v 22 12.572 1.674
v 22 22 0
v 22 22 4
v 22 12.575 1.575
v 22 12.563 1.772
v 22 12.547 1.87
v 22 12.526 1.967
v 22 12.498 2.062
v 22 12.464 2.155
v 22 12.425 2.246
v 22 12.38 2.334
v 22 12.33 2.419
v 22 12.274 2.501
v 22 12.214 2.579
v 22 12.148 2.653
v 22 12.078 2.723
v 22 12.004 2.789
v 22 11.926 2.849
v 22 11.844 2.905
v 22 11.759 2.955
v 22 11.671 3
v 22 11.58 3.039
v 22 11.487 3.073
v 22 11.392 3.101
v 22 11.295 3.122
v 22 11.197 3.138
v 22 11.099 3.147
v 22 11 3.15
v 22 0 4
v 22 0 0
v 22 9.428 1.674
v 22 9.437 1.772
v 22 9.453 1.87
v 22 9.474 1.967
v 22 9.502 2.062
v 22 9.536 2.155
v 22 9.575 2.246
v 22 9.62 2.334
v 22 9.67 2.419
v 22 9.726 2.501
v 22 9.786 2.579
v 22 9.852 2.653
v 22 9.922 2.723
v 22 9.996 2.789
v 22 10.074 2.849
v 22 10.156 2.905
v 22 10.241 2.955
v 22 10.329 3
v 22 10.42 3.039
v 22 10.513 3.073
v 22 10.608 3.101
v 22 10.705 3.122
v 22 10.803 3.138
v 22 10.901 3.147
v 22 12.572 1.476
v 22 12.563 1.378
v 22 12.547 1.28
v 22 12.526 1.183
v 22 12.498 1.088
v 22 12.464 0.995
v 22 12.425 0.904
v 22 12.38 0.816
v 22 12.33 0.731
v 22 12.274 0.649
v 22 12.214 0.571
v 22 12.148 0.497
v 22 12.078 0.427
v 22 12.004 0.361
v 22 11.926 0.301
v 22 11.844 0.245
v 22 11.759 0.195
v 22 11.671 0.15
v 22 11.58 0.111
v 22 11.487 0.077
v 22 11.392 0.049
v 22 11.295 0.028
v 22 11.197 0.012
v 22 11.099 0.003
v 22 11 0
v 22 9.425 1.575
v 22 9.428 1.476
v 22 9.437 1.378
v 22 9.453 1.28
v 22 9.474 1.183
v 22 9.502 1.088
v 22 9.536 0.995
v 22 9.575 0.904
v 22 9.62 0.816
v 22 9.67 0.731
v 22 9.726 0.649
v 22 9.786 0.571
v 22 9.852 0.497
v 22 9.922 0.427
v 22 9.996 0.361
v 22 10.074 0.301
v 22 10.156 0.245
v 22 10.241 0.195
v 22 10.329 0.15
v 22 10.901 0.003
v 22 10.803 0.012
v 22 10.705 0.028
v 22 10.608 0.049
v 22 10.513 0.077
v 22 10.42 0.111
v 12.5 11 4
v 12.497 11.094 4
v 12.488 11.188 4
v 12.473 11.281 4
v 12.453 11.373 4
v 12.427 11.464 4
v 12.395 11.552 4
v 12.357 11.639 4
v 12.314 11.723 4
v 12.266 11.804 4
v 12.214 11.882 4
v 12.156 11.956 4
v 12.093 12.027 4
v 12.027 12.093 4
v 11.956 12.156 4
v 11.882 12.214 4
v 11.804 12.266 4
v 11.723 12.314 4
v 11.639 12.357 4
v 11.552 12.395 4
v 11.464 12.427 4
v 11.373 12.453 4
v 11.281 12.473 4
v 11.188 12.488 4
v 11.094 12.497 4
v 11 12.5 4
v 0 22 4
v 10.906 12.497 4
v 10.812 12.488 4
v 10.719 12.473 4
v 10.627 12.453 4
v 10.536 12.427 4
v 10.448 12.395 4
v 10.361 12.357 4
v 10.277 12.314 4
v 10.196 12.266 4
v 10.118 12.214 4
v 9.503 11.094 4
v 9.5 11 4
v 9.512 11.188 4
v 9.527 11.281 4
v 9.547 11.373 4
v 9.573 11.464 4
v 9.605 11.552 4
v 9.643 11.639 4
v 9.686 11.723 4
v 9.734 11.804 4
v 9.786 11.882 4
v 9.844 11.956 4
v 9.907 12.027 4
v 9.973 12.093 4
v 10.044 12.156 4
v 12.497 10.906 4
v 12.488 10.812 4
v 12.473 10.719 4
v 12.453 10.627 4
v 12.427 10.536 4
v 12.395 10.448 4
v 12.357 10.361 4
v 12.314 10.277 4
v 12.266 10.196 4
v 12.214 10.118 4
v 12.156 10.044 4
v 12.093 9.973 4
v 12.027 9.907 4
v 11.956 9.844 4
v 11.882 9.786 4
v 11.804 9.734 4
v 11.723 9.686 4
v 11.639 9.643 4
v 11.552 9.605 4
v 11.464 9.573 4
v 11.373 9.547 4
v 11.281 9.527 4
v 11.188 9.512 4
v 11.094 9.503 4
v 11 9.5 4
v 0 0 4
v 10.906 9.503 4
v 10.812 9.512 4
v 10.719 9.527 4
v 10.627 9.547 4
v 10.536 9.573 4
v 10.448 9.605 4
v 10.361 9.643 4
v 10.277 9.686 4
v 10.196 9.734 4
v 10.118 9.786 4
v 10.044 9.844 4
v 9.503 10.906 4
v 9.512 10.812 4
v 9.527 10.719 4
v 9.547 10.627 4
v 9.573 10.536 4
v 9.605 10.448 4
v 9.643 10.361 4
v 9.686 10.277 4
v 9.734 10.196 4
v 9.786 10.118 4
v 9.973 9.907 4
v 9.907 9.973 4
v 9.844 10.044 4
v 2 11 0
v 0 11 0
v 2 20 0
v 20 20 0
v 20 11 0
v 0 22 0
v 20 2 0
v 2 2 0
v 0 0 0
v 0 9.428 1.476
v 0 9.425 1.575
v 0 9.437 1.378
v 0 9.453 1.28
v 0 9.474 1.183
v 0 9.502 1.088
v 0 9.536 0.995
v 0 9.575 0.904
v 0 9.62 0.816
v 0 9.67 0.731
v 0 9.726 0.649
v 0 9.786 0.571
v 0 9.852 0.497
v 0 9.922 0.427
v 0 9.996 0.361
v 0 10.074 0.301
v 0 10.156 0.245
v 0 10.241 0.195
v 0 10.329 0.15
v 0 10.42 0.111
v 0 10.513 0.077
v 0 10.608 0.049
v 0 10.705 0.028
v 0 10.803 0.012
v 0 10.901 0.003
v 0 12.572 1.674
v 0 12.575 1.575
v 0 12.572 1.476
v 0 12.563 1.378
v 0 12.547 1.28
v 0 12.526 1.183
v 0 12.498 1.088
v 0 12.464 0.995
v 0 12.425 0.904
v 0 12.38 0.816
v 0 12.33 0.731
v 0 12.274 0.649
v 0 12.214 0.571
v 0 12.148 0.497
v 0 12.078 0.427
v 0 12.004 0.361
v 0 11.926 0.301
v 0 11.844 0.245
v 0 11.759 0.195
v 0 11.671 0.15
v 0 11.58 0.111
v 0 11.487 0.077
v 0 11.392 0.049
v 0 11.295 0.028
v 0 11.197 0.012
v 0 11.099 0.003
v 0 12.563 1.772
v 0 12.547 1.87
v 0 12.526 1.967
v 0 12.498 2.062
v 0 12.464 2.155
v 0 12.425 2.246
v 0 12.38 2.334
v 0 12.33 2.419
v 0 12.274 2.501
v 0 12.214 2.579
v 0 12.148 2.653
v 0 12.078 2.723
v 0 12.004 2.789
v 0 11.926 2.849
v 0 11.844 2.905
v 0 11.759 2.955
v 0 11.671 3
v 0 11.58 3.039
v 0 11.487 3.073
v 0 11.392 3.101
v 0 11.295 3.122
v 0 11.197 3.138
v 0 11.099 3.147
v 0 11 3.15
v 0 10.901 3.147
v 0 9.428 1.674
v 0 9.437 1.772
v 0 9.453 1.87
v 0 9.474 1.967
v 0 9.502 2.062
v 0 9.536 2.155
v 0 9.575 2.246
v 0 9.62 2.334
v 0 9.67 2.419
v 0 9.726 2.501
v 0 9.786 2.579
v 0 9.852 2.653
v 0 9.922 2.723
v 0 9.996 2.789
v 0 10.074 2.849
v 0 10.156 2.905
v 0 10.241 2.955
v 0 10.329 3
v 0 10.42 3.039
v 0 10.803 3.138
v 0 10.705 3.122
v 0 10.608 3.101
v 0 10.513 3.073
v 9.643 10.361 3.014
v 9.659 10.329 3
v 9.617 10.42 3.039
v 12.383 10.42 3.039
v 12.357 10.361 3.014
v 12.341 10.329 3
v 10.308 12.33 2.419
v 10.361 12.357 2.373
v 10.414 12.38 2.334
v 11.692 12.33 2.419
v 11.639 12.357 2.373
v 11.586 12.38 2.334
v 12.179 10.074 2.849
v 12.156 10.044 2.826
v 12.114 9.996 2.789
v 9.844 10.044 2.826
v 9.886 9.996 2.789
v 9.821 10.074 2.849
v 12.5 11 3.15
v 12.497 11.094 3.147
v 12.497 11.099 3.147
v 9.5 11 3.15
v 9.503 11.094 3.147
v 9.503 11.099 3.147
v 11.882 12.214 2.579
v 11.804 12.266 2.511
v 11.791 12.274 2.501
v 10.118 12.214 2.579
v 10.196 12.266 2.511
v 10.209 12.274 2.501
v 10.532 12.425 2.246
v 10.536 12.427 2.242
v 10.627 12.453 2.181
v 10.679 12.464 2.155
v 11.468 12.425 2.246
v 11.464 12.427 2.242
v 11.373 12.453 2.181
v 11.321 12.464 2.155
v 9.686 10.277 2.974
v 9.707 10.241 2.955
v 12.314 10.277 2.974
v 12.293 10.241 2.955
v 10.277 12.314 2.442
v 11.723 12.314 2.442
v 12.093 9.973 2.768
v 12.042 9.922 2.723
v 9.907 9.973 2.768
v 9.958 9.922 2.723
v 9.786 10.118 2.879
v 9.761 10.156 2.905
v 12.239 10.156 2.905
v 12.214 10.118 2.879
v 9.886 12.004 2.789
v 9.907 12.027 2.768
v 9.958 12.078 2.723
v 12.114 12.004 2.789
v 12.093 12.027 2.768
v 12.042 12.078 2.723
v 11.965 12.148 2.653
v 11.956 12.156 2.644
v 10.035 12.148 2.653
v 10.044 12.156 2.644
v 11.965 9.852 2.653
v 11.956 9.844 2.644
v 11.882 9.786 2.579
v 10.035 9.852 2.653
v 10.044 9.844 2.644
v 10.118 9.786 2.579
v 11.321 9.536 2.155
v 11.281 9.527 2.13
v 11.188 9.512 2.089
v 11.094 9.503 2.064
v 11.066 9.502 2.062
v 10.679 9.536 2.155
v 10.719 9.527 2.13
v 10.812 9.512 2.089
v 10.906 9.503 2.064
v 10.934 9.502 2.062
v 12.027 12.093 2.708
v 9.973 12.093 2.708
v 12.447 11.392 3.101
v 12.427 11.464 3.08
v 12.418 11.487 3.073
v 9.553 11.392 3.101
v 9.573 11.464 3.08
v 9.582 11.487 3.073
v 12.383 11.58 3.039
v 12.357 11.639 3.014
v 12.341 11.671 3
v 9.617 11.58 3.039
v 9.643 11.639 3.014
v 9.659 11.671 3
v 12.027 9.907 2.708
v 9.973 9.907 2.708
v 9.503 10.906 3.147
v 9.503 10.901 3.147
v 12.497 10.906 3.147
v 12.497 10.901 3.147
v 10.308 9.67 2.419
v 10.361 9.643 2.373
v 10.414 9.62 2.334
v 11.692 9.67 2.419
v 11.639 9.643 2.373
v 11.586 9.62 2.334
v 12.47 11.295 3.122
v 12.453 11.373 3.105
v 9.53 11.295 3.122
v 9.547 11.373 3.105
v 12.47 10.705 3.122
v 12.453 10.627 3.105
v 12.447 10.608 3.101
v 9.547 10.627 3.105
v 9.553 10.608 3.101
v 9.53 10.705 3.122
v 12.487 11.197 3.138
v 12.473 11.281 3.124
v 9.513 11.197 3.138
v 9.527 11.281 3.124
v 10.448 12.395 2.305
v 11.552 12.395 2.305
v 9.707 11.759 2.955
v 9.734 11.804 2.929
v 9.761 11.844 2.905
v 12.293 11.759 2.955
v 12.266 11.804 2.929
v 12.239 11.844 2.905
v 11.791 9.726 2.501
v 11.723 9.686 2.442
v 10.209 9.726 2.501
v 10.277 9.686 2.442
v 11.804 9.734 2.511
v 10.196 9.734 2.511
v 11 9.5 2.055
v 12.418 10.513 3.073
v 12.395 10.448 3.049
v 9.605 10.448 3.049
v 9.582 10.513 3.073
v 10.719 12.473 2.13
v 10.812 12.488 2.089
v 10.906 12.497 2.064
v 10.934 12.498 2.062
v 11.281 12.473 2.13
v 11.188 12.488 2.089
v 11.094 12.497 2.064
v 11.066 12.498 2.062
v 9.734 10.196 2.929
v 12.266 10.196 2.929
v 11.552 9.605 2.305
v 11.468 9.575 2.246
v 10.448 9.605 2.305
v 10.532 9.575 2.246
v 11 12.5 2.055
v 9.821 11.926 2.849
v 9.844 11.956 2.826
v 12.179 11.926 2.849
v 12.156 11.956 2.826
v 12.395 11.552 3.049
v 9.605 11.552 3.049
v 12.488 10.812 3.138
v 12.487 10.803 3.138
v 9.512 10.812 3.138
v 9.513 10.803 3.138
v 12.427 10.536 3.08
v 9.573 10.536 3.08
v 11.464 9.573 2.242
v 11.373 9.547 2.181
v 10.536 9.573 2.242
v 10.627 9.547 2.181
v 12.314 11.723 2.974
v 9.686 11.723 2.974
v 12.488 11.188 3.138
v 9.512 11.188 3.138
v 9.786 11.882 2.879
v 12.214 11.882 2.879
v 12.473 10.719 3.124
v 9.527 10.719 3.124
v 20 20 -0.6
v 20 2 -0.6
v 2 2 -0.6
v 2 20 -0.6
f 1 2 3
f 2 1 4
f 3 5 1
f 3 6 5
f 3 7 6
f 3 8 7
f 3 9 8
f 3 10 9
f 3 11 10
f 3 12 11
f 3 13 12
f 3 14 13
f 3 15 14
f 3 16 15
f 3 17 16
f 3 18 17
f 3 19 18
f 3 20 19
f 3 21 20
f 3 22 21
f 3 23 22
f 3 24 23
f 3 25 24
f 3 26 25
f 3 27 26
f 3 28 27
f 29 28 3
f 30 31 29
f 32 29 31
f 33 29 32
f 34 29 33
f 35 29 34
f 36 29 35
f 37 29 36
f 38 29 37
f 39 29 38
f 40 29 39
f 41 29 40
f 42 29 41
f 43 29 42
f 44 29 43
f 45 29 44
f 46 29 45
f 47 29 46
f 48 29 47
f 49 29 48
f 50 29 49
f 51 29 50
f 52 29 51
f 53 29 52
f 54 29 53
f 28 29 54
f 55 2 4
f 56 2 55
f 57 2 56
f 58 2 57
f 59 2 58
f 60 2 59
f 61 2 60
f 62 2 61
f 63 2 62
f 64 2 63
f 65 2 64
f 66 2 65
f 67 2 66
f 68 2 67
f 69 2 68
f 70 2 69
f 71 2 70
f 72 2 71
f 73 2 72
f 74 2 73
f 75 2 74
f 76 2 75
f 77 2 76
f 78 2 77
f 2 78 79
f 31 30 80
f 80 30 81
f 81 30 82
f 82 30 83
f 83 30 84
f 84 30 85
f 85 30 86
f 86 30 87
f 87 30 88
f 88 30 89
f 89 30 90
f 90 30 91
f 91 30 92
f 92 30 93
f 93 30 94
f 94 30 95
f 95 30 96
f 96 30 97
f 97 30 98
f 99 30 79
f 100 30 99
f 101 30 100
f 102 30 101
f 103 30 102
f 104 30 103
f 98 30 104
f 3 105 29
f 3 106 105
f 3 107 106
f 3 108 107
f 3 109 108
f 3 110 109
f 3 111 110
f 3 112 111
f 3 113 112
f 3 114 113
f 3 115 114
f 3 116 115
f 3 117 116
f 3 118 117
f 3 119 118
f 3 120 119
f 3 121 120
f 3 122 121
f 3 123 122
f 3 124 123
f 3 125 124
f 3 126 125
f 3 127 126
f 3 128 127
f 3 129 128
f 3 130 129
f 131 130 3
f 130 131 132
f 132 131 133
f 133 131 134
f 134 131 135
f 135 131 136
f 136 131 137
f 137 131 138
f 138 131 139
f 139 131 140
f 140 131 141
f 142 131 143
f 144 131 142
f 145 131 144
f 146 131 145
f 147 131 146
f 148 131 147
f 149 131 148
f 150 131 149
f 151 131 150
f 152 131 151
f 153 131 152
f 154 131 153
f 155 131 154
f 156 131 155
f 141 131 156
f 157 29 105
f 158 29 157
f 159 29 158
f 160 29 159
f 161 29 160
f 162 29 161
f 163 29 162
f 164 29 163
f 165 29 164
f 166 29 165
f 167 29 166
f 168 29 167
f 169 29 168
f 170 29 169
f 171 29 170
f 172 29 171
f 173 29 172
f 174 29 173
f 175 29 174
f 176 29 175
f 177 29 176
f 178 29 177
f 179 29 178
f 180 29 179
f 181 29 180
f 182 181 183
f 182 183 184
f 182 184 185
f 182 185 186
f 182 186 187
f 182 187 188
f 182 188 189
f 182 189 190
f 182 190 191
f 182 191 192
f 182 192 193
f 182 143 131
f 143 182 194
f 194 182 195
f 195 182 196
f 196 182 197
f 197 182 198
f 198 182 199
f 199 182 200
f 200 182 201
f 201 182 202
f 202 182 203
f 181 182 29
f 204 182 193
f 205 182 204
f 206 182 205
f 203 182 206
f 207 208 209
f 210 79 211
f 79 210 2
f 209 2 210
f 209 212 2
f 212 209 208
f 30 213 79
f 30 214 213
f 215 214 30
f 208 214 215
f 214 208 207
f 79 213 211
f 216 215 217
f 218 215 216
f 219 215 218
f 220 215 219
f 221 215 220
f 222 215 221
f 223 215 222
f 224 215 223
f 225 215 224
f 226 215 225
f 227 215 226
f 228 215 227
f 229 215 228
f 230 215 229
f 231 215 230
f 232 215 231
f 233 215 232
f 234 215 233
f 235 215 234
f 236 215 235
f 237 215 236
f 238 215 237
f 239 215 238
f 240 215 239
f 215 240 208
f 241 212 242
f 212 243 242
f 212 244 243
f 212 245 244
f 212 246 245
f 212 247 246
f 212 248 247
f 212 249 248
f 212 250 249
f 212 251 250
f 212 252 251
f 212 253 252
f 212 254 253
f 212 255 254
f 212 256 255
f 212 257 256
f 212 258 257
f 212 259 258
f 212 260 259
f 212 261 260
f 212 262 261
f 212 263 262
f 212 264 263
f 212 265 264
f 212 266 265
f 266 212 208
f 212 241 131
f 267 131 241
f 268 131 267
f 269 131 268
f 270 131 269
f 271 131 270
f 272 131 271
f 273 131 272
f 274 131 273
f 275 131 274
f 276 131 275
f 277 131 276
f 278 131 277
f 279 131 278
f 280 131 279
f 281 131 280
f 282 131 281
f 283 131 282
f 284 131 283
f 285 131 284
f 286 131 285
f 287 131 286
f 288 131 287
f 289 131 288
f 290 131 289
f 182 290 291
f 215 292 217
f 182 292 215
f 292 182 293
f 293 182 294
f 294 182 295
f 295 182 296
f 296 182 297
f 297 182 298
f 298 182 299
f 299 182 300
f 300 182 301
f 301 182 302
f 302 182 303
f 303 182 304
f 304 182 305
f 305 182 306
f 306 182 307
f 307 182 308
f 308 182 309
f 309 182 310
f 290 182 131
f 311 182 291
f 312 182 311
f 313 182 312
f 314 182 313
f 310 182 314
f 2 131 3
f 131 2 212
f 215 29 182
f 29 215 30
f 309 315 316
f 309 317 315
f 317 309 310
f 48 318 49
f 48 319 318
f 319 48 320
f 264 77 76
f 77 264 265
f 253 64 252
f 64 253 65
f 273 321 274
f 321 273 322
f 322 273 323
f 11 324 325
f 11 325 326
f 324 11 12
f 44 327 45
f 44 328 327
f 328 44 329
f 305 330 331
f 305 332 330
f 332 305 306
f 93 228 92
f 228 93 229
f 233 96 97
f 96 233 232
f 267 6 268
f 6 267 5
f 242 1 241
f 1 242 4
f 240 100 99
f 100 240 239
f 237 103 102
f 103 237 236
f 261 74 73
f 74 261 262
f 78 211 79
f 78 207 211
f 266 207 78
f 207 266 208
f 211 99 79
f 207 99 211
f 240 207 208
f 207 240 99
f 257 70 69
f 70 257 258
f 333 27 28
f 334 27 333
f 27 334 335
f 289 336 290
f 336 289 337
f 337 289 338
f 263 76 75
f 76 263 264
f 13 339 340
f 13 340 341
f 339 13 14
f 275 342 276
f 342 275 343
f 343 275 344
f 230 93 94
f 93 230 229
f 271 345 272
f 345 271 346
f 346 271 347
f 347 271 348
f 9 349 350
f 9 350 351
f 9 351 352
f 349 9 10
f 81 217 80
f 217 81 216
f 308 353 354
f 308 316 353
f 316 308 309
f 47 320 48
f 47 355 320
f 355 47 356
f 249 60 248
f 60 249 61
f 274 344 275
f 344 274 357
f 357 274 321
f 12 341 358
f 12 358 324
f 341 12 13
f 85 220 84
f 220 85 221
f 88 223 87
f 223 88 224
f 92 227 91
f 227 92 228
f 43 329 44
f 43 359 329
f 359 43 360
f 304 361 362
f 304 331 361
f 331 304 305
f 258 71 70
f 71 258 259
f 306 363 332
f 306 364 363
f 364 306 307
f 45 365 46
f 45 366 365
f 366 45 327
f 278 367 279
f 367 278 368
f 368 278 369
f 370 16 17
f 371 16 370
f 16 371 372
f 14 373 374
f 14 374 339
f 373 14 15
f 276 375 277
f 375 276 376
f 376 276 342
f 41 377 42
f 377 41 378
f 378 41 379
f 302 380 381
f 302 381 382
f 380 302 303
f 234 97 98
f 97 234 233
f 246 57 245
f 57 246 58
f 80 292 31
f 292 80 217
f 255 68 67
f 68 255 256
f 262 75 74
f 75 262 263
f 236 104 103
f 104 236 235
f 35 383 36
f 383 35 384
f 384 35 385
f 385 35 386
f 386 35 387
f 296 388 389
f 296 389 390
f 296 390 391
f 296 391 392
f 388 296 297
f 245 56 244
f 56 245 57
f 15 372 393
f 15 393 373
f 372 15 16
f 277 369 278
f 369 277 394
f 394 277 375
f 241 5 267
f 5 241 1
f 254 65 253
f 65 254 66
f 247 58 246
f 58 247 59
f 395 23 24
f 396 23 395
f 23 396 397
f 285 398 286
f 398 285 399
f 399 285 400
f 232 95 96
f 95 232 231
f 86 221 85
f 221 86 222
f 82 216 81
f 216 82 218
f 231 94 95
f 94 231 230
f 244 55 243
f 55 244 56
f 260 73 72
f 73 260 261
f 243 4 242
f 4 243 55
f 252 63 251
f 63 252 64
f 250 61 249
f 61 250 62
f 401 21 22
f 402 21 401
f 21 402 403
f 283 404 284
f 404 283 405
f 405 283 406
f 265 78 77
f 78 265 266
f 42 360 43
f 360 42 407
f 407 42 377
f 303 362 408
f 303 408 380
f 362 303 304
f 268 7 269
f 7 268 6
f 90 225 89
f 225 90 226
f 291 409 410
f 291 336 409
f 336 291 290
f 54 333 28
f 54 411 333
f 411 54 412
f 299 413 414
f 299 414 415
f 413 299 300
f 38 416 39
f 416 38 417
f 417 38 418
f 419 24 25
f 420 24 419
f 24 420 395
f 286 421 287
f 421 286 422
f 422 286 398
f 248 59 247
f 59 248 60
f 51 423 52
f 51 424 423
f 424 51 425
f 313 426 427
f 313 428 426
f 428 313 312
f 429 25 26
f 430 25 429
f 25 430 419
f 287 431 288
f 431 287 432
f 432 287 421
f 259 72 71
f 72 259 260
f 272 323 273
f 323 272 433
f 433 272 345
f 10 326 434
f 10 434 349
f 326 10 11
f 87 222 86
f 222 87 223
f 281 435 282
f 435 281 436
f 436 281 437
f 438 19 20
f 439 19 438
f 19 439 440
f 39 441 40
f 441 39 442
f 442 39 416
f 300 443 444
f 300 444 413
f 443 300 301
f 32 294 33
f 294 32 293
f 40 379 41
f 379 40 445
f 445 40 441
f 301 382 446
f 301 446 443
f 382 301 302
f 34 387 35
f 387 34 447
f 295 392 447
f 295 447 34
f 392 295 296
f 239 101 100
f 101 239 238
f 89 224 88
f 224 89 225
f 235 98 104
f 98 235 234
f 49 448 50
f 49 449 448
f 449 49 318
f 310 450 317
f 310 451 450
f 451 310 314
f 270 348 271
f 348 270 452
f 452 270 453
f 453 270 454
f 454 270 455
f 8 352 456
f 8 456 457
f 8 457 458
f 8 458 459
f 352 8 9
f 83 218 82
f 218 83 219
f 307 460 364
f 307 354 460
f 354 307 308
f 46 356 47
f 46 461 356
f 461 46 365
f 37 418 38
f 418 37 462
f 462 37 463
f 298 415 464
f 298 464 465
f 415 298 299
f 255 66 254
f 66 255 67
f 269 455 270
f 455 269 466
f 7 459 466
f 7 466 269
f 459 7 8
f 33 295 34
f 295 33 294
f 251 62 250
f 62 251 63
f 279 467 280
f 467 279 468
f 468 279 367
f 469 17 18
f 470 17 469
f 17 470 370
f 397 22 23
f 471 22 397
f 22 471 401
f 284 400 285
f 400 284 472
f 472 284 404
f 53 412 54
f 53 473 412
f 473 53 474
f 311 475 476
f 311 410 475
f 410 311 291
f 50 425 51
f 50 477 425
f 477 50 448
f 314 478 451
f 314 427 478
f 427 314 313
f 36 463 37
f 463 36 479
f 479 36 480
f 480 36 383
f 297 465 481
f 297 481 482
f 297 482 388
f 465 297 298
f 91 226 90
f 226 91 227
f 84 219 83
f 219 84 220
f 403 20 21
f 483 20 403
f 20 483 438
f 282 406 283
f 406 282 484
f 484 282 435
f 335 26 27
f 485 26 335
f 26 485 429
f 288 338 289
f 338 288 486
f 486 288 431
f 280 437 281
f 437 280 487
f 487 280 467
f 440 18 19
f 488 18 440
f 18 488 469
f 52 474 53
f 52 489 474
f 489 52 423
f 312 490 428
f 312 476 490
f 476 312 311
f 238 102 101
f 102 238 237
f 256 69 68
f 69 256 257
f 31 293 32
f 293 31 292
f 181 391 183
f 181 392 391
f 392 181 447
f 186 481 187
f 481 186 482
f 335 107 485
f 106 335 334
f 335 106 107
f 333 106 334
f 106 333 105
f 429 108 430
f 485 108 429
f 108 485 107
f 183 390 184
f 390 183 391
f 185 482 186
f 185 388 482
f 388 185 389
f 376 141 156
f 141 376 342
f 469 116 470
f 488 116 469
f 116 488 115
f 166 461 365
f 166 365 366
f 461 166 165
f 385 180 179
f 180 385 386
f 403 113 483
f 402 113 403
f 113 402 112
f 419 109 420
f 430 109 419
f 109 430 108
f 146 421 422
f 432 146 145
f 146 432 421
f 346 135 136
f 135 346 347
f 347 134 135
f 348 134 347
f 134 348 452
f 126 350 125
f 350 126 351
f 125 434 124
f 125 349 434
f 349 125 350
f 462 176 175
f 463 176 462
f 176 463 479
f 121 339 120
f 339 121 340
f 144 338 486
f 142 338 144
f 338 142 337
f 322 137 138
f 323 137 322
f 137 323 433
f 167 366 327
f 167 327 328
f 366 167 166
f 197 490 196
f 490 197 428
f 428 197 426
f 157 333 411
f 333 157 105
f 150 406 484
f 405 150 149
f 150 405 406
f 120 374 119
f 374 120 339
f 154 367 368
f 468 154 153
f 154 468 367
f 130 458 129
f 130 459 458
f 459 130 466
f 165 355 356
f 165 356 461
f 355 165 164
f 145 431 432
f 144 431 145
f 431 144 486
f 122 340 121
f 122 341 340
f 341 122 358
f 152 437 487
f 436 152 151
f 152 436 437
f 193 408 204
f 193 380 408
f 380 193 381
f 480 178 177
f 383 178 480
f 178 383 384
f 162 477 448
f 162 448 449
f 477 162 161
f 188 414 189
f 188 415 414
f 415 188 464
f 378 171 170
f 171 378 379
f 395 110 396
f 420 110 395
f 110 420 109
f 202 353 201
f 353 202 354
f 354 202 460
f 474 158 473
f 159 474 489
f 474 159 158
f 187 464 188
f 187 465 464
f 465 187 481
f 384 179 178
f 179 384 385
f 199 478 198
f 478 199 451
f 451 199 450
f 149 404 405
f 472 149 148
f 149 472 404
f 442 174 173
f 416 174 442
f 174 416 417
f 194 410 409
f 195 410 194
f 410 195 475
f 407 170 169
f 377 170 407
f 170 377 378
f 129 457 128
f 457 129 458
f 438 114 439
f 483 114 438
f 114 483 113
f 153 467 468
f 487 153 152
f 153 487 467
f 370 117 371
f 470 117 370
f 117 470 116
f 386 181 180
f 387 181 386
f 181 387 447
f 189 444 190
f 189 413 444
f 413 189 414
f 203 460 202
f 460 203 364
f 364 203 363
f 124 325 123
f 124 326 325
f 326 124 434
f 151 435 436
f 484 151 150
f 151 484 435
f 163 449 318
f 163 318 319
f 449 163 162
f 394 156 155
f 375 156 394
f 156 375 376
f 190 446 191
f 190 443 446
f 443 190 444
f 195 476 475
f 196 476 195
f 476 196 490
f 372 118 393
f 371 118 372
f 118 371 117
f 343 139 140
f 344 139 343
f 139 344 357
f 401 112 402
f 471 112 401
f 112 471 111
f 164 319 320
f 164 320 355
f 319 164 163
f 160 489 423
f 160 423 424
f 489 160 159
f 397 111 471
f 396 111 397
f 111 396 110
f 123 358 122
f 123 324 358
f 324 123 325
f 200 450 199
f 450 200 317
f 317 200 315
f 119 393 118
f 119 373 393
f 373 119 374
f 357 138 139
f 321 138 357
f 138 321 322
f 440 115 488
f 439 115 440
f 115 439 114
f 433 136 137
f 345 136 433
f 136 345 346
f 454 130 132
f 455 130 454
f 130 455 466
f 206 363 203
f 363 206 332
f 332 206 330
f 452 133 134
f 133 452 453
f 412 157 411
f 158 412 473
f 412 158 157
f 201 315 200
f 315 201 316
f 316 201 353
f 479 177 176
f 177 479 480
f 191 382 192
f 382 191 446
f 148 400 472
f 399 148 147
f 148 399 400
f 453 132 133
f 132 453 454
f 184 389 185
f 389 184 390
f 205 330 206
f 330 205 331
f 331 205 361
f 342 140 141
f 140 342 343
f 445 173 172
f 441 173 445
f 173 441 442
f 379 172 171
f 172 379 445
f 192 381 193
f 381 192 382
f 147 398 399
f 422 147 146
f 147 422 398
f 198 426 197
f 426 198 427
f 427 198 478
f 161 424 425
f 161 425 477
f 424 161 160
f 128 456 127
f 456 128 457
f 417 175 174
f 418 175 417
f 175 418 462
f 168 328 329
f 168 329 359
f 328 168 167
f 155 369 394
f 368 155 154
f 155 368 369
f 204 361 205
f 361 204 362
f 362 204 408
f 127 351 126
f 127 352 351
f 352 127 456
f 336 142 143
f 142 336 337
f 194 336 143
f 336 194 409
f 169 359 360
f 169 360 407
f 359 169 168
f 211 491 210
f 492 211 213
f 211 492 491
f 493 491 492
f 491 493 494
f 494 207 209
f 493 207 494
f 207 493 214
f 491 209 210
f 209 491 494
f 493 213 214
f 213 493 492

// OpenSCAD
res=100;
h=(1.5/4.1)*(4.65-2.3);
hh=0.6;
translate([2,2,-hh])cube([18,18,hh]);
difference(){
    cube([22,22,4]);
    #translate([0,11,3.15/2])rotate([0,90,0])cylinder(22,3.15/2,3.15/2,$fn=res);
    
    #translate([11,11,2])cylinder(20,3/2,3/2,$fn=res);
}
